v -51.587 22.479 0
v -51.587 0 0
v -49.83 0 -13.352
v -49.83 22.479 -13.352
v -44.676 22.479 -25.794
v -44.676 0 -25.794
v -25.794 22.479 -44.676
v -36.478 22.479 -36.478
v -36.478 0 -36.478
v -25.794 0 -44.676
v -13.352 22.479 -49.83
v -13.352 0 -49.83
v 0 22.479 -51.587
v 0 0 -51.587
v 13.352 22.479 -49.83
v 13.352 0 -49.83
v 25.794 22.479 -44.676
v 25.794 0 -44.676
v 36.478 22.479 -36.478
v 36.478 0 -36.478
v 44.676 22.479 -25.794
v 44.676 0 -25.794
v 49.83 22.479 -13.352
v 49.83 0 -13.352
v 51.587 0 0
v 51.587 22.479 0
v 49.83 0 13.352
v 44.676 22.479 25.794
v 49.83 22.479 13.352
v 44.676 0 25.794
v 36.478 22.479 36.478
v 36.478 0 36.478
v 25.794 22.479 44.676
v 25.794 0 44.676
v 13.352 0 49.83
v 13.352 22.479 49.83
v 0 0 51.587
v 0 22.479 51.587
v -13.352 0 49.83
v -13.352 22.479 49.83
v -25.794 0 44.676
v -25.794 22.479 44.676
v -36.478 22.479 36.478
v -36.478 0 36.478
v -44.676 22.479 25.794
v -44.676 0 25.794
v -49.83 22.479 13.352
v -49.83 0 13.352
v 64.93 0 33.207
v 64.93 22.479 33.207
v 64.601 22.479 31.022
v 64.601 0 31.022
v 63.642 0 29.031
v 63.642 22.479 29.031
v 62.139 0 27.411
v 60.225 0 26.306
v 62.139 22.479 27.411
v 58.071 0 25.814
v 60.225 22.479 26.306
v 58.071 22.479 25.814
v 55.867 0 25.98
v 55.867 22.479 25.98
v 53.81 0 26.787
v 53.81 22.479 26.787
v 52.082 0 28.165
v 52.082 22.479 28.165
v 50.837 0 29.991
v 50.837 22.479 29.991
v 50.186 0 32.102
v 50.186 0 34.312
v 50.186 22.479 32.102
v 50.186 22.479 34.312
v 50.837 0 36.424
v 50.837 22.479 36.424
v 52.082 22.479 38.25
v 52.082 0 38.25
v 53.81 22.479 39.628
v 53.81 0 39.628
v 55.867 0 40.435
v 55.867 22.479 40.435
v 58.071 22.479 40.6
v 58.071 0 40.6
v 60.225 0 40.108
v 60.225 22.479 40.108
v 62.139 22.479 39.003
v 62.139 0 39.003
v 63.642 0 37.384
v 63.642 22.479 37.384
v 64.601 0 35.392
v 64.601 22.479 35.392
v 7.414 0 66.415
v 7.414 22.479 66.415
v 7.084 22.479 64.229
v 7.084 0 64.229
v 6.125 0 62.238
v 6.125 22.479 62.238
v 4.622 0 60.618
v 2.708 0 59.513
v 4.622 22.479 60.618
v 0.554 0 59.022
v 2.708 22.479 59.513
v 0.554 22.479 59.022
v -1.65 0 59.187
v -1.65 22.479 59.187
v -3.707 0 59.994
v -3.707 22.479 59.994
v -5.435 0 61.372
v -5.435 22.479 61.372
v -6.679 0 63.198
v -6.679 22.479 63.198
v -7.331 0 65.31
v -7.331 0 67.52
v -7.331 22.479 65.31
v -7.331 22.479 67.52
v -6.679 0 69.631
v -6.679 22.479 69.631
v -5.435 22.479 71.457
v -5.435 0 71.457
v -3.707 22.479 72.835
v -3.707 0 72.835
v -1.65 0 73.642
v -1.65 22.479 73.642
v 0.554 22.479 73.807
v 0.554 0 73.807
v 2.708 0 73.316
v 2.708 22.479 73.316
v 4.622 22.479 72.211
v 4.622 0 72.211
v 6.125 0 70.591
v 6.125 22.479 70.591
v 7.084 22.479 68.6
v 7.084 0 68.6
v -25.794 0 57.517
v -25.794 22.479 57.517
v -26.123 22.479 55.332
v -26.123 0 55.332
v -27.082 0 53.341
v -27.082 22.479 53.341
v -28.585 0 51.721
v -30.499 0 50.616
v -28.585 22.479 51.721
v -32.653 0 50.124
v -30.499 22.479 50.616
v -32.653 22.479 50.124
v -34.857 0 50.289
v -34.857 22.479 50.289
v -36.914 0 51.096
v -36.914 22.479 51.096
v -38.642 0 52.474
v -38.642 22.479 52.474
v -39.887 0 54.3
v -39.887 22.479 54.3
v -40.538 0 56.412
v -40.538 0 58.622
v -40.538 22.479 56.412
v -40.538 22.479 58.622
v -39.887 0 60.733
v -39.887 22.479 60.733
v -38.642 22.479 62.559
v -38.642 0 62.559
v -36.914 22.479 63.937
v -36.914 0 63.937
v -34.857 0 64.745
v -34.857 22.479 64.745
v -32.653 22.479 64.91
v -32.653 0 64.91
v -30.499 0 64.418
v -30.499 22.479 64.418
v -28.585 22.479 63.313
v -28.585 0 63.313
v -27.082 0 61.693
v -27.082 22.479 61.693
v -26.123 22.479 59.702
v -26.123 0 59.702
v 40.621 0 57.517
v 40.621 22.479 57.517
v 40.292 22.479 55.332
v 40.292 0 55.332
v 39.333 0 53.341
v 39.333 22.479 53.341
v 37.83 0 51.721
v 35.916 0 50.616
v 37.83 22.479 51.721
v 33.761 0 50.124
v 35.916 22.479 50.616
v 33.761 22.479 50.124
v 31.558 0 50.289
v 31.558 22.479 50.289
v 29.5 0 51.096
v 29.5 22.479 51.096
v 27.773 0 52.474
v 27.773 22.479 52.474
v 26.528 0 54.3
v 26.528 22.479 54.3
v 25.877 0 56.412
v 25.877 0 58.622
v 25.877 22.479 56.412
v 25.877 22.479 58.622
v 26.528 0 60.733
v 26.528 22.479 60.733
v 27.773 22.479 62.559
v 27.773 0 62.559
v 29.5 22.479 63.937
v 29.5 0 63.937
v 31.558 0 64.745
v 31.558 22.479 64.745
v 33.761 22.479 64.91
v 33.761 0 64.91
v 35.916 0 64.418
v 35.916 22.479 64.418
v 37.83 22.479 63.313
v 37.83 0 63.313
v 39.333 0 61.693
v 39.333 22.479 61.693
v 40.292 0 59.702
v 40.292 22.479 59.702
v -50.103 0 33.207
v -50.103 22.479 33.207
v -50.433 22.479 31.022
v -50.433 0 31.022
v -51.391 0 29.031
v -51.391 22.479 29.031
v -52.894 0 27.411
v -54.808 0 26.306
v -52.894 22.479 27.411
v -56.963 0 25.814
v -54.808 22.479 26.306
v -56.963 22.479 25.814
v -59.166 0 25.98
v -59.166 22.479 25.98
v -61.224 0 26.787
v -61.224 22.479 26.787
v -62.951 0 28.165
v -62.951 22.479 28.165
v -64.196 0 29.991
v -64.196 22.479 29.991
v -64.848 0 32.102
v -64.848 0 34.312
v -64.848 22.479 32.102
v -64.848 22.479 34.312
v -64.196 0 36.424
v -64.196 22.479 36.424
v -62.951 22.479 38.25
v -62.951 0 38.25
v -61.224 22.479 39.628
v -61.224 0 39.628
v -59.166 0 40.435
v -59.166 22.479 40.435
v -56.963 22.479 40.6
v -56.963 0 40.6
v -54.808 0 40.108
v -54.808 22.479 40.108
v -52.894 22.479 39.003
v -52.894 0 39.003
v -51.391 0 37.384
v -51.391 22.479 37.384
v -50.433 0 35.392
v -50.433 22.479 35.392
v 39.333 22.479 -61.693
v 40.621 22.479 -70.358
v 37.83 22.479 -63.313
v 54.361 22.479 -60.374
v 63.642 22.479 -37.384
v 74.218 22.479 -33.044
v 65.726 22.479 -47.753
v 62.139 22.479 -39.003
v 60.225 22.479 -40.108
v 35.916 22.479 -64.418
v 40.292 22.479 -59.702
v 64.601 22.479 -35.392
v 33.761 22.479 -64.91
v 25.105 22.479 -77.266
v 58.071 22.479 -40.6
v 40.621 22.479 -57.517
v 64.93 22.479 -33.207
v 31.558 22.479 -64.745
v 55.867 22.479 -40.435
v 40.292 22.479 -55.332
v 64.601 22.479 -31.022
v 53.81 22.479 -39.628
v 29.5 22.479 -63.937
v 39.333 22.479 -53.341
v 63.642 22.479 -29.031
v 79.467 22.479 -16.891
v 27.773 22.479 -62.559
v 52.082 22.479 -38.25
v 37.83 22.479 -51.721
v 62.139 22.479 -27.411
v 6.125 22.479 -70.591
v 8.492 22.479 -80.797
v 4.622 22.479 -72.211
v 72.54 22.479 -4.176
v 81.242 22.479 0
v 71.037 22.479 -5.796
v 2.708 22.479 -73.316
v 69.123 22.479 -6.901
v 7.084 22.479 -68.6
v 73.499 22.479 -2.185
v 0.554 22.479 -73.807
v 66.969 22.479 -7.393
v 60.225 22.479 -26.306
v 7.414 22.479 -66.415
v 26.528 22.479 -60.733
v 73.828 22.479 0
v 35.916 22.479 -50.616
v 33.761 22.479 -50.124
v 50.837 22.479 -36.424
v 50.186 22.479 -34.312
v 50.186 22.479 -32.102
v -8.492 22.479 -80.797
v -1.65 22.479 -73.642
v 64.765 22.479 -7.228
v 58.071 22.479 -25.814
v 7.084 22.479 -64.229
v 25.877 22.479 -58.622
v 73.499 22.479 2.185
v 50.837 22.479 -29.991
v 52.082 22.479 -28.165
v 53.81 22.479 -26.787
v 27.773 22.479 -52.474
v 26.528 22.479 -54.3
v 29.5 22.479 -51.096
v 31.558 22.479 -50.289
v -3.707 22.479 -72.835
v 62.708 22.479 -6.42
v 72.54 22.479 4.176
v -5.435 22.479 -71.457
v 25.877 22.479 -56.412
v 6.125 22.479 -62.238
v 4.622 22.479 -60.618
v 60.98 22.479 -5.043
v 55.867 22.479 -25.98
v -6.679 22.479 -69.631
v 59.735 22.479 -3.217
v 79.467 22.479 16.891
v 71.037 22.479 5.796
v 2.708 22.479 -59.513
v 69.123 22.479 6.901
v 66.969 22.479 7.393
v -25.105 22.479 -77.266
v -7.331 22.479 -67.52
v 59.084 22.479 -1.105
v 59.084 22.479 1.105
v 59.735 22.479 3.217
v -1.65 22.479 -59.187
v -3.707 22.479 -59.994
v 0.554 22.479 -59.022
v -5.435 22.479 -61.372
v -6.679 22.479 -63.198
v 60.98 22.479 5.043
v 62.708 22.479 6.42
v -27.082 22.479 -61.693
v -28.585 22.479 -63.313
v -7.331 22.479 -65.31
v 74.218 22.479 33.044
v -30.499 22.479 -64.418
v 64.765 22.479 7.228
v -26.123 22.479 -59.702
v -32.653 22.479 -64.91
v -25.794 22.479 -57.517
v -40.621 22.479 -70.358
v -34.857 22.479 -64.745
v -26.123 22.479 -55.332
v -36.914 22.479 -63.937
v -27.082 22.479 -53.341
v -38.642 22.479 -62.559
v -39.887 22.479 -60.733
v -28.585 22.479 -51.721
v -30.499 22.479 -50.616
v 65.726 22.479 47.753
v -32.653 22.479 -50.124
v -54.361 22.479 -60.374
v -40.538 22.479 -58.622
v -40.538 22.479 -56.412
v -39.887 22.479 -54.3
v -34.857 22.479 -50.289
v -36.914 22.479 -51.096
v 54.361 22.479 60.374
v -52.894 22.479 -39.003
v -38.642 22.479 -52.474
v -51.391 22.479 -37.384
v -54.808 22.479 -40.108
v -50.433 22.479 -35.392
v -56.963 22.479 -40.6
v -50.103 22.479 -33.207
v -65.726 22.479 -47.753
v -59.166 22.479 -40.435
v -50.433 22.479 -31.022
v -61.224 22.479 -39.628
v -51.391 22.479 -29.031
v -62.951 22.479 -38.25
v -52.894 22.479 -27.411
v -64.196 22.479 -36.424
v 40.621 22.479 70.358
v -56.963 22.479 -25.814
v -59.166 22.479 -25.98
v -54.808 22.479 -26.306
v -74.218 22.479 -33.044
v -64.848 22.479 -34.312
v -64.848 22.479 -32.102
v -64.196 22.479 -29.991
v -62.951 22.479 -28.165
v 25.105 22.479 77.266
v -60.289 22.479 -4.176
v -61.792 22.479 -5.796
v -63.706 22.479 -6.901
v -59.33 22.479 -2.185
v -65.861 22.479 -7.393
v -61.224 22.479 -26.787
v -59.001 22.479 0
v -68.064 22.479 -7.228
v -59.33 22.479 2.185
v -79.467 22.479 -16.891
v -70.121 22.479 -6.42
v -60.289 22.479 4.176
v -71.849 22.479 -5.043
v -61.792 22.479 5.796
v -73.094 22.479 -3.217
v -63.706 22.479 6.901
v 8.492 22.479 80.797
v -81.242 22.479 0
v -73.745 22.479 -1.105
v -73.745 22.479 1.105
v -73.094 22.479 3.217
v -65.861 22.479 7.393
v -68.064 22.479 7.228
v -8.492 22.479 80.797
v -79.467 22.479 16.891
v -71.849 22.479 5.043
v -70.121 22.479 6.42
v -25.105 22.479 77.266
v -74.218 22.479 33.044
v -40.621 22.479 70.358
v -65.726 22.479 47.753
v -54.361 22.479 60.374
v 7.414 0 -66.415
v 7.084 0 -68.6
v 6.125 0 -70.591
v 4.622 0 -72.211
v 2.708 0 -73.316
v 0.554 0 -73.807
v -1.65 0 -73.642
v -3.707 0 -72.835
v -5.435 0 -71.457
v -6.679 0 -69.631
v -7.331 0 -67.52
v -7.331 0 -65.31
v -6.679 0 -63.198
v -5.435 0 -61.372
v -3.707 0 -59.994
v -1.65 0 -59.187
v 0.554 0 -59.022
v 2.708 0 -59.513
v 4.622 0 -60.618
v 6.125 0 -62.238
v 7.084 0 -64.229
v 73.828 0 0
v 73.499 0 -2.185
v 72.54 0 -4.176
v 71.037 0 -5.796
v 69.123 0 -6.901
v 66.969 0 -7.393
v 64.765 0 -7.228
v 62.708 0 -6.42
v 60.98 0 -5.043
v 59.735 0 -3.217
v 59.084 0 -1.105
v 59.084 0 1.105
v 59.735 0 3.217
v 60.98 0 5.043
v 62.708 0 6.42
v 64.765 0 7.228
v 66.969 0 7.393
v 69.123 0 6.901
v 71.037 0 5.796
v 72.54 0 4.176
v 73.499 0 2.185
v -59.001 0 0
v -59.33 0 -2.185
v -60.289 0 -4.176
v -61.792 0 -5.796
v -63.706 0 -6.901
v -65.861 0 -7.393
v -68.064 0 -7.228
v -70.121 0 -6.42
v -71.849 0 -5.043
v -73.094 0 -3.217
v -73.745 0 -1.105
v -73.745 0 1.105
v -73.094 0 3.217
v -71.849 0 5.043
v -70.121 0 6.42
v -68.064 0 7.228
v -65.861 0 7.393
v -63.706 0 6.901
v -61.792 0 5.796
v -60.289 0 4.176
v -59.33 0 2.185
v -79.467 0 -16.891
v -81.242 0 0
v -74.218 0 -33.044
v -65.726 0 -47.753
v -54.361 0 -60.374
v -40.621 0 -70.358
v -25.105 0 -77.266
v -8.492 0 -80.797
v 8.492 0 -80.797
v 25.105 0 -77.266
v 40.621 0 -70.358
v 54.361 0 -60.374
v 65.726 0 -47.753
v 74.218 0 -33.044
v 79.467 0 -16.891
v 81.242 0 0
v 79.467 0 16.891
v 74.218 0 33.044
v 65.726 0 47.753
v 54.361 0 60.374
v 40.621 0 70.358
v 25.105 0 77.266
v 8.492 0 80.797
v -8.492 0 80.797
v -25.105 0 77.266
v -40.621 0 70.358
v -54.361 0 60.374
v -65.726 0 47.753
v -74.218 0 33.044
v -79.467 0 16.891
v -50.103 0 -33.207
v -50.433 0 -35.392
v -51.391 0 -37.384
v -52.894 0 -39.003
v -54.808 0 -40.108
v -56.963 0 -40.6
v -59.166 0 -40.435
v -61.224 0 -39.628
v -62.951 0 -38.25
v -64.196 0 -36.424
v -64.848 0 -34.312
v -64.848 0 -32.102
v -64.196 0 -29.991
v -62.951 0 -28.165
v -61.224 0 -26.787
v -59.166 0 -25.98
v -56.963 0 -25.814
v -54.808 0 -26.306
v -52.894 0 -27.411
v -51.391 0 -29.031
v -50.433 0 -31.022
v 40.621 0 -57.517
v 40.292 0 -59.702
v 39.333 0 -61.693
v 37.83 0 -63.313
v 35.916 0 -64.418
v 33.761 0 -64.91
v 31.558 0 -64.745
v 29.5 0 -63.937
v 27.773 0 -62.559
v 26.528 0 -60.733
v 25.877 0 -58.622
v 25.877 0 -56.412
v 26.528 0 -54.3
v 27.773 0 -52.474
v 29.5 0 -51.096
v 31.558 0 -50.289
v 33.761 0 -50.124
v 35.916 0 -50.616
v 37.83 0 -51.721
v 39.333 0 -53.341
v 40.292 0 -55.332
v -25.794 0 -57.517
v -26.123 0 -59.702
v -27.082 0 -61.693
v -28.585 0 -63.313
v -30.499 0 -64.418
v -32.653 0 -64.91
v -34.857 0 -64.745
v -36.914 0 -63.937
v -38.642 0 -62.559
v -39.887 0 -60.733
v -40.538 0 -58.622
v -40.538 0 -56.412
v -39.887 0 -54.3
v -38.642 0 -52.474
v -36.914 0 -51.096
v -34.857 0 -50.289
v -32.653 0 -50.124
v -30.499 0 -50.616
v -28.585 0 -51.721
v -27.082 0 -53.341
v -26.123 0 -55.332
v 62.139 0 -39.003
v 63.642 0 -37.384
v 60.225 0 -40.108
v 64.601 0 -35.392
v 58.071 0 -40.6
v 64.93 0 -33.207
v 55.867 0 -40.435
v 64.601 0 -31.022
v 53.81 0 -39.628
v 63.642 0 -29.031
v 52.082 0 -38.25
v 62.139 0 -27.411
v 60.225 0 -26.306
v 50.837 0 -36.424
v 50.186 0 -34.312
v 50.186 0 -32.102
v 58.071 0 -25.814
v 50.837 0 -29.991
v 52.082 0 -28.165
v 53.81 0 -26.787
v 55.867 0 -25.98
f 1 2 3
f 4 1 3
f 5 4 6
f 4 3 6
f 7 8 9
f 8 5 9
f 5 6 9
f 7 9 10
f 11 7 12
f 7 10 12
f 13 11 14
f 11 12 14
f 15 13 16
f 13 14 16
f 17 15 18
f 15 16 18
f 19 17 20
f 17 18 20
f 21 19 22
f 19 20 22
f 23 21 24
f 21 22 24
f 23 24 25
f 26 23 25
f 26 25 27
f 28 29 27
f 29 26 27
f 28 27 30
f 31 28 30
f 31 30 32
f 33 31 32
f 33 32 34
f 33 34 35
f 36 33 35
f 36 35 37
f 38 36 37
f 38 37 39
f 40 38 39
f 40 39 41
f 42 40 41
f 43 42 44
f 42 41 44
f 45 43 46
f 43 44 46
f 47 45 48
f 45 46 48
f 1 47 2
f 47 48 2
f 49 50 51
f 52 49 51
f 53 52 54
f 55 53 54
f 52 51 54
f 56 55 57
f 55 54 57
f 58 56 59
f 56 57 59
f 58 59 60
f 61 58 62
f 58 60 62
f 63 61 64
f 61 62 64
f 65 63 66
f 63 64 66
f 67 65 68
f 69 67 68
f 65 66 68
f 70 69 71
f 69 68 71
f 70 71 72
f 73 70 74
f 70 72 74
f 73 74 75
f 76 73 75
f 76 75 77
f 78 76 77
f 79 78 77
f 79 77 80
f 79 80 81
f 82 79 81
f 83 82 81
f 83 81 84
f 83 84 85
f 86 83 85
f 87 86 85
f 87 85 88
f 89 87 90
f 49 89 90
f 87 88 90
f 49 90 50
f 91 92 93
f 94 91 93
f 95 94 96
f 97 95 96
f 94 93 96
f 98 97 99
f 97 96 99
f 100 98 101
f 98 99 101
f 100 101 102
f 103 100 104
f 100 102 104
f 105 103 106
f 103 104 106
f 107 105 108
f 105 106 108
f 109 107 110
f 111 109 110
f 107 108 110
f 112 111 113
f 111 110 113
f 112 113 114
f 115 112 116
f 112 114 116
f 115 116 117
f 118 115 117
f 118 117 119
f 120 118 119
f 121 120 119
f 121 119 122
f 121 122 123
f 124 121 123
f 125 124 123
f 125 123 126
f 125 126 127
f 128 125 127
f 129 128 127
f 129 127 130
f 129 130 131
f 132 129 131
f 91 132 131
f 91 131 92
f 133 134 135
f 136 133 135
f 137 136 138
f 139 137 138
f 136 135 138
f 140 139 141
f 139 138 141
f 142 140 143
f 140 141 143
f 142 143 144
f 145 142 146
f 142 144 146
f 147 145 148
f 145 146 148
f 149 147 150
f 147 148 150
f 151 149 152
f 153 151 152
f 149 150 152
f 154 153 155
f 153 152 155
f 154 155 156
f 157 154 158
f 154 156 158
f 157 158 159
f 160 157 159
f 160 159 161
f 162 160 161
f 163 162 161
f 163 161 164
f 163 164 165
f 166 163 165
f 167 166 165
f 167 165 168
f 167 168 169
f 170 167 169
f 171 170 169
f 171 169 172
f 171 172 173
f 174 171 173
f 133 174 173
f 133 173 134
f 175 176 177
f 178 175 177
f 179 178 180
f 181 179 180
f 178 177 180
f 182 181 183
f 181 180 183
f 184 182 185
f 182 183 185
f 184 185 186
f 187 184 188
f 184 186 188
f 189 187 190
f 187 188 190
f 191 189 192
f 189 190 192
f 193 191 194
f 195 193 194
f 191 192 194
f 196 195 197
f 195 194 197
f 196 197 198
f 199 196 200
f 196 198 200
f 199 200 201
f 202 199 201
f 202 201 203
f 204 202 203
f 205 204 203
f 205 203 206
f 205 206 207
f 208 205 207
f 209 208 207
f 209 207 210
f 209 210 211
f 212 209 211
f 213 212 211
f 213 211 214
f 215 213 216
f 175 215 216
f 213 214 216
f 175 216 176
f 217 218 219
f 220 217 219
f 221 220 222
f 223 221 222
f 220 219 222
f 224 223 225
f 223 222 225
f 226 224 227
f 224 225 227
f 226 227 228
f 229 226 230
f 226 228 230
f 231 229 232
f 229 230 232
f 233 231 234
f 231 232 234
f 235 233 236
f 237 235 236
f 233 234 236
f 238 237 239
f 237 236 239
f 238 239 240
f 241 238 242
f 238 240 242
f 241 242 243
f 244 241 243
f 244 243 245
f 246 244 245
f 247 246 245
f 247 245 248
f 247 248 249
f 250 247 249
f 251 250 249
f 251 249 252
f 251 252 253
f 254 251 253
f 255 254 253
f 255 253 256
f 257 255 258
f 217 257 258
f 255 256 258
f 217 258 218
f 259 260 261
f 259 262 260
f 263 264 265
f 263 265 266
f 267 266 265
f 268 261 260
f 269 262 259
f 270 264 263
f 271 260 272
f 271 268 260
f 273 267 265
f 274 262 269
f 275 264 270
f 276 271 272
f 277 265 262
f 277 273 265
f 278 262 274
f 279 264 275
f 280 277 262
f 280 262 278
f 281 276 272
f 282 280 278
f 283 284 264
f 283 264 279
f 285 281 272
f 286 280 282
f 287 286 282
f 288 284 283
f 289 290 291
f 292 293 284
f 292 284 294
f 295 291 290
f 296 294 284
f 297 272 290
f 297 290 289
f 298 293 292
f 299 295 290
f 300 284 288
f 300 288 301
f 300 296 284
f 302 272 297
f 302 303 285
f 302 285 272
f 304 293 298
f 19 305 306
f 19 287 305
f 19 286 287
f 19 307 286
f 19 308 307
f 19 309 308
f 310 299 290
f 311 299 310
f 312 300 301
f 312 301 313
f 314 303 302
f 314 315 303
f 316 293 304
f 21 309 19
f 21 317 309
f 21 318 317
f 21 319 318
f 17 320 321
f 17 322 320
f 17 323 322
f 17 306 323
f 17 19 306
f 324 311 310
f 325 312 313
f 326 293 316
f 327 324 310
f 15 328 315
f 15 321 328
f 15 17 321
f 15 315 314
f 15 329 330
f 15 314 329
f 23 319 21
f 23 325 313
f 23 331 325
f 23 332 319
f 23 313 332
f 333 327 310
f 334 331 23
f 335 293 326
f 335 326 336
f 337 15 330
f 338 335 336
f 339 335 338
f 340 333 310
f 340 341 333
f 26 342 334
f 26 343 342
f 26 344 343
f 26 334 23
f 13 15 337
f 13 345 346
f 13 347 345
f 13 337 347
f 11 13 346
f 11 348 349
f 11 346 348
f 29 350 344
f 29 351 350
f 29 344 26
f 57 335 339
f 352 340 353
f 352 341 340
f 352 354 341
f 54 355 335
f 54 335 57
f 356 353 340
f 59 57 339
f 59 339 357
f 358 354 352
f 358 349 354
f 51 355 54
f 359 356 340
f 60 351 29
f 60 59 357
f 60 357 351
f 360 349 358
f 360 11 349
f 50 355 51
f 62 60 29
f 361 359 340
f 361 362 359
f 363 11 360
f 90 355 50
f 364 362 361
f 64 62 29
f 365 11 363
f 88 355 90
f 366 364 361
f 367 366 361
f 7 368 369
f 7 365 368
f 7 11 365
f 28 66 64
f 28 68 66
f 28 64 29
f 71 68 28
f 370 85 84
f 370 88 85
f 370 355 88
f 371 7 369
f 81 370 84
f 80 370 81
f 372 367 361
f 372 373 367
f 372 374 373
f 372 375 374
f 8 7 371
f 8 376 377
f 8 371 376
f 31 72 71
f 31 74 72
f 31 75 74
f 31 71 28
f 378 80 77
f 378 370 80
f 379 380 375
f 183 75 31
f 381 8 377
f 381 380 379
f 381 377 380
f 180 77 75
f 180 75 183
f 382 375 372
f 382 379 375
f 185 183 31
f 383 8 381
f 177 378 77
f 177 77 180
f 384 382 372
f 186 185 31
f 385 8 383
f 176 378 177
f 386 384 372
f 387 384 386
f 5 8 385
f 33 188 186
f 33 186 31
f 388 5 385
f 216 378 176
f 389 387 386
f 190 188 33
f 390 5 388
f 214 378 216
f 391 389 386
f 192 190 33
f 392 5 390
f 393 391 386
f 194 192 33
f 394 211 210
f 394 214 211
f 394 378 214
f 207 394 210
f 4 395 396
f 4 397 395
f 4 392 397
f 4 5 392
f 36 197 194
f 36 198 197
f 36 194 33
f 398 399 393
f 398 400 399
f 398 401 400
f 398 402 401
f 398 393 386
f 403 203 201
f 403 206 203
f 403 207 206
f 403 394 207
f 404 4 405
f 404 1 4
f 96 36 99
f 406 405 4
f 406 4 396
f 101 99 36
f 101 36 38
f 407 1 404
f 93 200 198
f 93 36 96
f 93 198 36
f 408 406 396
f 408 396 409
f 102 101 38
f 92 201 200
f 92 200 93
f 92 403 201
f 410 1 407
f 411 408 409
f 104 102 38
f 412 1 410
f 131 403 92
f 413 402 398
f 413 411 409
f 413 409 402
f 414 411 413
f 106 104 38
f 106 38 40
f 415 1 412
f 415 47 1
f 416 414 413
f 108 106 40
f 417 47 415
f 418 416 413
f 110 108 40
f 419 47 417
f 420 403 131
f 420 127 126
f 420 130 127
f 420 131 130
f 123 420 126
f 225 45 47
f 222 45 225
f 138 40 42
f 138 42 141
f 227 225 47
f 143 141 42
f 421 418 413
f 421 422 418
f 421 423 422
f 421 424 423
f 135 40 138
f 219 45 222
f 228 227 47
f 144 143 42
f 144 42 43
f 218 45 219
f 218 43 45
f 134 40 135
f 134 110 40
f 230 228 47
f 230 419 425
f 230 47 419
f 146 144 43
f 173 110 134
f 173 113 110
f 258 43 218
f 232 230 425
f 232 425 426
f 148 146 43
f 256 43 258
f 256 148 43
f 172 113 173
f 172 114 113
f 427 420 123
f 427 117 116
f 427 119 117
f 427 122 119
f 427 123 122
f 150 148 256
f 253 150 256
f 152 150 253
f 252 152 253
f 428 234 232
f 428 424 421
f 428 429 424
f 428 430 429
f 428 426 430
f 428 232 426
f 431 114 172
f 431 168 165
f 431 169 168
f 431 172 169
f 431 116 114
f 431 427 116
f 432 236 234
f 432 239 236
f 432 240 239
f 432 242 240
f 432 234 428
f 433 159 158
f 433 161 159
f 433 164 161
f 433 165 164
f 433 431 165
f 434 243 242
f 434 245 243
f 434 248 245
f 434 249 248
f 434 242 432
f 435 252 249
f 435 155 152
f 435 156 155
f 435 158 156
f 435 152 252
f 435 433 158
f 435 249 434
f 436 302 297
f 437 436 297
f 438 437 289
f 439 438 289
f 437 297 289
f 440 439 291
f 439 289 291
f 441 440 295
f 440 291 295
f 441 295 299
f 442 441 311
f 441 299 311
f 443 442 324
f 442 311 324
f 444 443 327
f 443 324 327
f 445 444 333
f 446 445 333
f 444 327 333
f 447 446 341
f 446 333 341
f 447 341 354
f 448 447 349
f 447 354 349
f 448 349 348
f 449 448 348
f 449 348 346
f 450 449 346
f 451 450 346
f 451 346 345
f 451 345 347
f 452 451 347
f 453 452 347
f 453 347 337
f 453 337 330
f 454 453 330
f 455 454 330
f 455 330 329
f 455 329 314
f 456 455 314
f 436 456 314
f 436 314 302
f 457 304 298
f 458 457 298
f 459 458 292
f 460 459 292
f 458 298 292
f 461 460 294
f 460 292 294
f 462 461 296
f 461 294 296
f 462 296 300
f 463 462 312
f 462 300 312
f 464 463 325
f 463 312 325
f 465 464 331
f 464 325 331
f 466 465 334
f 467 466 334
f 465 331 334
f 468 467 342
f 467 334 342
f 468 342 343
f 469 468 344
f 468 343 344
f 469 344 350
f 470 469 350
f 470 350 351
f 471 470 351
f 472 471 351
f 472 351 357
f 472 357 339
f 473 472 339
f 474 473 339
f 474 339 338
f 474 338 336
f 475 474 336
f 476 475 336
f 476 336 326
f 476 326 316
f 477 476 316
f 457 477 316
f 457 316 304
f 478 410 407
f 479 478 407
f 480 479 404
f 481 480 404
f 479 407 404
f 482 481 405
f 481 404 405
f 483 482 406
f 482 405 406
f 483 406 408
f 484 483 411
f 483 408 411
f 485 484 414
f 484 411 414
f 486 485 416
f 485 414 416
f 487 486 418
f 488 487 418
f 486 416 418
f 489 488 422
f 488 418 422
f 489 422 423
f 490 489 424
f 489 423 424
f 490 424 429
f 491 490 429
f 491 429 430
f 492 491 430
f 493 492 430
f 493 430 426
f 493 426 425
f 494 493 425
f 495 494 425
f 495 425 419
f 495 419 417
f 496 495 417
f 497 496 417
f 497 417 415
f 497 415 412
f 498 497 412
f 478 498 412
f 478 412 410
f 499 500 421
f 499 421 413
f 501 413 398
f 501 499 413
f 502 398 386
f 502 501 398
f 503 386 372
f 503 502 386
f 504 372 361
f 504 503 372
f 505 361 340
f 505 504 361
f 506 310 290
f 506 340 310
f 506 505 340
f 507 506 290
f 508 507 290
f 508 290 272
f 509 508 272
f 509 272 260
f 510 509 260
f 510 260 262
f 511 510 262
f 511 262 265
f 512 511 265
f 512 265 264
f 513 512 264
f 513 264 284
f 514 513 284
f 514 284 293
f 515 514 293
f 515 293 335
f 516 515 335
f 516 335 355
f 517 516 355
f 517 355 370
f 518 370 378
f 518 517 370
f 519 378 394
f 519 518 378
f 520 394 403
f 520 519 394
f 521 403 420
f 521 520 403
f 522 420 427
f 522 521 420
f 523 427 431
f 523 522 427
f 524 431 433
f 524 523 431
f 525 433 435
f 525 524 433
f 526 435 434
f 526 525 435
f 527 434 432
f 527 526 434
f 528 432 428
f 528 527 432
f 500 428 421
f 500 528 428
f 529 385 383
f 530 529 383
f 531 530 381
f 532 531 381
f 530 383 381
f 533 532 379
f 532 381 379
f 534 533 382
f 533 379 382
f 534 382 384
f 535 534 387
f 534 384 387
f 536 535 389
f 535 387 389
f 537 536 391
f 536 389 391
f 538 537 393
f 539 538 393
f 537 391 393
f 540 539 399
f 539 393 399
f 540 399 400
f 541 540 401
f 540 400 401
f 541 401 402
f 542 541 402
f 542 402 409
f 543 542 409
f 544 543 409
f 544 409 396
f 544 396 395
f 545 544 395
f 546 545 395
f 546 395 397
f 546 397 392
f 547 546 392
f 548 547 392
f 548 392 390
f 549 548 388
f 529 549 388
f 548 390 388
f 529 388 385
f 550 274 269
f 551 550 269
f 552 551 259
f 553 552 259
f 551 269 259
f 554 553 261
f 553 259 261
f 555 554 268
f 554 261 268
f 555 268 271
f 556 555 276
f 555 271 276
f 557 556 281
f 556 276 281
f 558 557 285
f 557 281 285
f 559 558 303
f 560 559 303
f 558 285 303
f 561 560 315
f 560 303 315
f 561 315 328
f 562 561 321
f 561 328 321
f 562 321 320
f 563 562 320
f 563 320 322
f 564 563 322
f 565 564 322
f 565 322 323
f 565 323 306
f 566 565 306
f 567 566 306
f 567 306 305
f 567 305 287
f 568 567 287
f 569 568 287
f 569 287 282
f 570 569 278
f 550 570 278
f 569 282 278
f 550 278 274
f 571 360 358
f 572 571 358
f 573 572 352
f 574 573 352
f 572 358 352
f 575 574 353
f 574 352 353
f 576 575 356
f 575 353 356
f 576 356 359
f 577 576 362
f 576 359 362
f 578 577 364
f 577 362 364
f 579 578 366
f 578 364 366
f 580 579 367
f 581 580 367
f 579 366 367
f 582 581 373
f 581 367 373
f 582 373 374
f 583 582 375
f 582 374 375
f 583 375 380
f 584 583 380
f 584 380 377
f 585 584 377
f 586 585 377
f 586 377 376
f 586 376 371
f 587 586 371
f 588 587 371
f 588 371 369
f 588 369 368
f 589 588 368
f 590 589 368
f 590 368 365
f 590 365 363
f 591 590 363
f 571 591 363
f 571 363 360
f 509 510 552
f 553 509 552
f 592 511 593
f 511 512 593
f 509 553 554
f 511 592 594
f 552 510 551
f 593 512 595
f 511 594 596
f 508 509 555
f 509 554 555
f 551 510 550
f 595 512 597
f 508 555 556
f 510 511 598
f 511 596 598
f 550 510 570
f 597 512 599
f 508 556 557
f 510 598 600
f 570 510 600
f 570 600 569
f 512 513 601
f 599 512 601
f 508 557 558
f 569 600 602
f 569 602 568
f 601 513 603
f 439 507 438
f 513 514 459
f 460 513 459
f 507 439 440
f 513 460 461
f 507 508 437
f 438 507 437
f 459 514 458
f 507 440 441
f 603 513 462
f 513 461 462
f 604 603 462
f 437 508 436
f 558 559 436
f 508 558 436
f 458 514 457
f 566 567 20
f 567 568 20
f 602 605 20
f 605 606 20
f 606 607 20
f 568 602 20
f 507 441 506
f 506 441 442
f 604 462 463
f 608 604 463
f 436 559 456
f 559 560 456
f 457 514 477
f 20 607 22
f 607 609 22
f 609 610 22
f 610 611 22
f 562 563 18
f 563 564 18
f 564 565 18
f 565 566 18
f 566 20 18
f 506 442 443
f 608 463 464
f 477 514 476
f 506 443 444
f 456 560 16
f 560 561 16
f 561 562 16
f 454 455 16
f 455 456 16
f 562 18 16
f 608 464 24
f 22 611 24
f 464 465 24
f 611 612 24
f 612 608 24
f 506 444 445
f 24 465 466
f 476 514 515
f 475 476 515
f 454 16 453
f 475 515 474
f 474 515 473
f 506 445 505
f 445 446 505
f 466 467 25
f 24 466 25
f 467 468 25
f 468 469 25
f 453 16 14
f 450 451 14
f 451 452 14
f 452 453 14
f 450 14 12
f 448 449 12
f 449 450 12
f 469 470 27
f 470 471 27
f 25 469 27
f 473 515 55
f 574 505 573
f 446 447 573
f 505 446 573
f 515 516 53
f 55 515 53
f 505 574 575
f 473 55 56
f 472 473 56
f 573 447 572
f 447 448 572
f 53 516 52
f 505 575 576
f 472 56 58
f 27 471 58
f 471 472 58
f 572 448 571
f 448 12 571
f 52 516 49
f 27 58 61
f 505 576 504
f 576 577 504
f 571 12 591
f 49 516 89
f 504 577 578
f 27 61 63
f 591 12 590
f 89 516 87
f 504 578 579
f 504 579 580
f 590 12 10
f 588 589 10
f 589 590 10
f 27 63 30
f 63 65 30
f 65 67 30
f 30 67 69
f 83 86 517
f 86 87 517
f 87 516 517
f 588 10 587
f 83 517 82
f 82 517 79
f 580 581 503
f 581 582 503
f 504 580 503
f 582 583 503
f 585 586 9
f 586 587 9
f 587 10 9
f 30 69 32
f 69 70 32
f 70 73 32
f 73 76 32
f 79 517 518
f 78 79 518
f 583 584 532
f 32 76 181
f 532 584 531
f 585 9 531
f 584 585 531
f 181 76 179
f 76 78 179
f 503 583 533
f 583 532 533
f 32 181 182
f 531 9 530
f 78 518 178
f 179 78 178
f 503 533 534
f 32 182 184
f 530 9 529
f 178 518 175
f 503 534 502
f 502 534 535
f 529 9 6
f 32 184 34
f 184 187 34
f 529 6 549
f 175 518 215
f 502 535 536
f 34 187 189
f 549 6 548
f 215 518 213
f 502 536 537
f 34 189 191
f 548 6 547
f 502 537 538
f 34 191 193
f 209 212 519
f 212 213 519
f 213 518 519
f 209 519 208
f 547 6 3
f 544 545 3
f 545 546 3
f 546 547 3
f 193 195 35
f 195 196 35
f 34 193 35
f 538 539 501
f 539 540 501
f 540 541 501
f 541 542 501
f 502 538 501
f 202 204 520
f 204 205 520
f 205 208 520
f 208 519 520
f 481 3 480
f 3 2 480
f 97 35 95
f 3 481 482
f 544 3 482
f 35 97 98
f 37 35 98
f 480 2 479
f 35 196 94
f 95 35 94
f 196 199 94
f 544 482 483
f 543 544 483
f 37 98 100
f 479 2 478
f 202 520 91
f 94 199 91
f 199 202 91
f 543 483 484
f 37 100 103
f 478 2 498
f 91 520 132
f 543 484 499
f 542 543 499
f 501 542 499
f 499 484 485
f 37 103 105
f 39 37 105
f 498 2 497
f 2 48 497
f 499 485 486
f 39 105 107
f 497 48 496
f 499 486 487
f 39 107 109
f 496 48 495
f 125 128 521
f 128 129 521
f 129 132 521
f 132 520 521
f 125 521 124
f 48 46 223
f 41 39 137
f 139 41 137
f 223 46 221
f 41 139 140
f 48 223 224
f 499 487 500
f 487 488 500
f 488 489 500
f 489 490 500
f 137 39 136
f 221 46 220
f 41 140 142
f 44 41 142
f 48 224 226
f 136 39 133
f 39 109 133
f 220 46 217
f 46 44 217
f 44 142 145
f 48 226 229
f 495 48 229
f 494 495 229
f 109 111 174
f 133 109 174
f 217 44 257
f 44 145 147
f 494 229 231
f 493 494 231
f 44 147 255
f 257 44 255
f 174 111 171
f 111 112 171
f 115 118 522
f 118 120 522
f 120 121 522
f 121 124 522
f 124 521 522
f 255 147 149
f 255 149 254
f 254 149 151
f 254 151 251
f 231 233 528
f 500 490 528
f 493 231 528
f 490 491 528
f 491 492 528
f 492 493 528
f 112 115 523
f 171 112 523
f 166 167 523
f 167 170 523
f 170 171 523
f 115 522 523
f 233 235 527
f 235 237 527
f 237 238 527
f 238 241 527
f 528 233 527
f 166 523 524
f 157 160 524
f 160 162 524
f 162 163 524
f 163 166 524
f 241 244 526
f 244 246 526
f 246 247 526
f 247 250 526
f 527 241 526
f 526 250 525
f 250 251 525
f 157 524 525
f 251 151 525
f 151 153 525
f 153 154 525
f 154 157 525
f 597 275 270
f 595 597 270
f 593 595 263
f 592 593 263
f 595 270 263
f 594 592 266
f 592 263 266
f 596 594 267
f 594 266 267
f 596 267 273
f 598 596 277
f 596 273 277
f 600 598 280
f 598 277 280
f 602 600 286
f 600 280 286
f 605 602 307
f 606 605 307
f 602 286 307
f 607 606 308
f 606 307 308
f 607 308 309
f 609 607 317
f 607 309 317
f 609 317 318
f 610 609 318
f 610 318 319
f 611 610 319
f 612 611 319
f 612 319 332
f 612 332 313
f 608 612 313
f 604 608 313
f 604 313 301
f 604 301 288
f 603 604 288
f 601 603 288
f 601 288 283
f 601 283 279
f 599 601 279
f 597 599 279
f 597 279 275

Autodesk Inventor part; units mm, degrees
ref_plane "YZ Plane" through (0, 0, 0) normal (1, 0, 0) x (0, 1, 0)
ref_plane "XZ Plane" through (0, 0, 0) normal (0, 1, 0) x (-1, 0, 0)
ref_plane "XY Plane" through (0, 0, 0) normal (0, 0, 1) x (1, 0, 0)
sketch "Sketch1" plane through (0, 0, 0) normal (0, 1, 0) x (-1, 0, 0)
  circle A0 centre (0, 0) radius 51.5874
  circle A1 centre (0, 0) radius 81.2419
  dimension "d0" = 103.1748
  dimension "d1" = 162.4838
extrude "Extrusion1" add sketch "Sketch1" along normal blind 22.479
sketch "Sketch2" plane through (0, 22.479, 0) normal (0, 1, 0) x (1, 0, 0)
  circle A0 centre (66.4146, 0) radius 7.4136
  circle A1 centre (57.5168, 33.2073) radius 7.4136
  circle A2 centre (33.2073, 57.5168) radius 7.4136
  circle A3 centre (0, 66.4146) radius 7.4136
  circle A4 centre (-33.2073, 57.5168) radius 7.4136
  circle A5 centre (-57.5168, 33.2073) radius 7.4136
  circle A6 centre (-66.4146, 0) radius 7.4136
  circle A7 centre (-57.5168, -33.2073) radius 7.4136
  circle A8 centre (-33.2073, -57.5168) radius 7.4136
  circle A9 centre (0, -66.4146) radius 7.4136
  circle A10 centre (33.2073, -57.5168) radius 7.4136
  circle A11 centre (57.5168, -33.2073) radius 7.4136
  point P0 (0, 0)
  dimension "d4" = 14.8272
  dimension "d6" = 66.4146
  dimension "d9" = 360
extrude "Extrusion2" cut sketch "Sketch2" against normal through all
equation "\"d0\" = insideDiam"
equation "\"d1\" = outsideDiam"
equation "\"d2\" = thickness"
equation "\"d4\" = stregthenHoleDiam"
equation "\"d6\" = shellRadius"
equation "\"d11\" = thickness"
equation "\"thickness\" = 22.479"
equation "\"printerError\" = 0.508"
equation "\"shellWidth\" = -0.5 * insideDiam + 0.5 * outsideDiam"
equation "\"stregthenHoleDiam\" = 0.5 * shellWidth"
equation "\"shellRadius\" = 0.5 * outsideDiam - 0.5 * shellWidth"
equation "\"numberOfHoles\" = 30.48"
equation "\"insideDiam\" = 103.1748"
equation "\"outsideDiam\" = 162.4838"
properties part number "vexSupportRing"
